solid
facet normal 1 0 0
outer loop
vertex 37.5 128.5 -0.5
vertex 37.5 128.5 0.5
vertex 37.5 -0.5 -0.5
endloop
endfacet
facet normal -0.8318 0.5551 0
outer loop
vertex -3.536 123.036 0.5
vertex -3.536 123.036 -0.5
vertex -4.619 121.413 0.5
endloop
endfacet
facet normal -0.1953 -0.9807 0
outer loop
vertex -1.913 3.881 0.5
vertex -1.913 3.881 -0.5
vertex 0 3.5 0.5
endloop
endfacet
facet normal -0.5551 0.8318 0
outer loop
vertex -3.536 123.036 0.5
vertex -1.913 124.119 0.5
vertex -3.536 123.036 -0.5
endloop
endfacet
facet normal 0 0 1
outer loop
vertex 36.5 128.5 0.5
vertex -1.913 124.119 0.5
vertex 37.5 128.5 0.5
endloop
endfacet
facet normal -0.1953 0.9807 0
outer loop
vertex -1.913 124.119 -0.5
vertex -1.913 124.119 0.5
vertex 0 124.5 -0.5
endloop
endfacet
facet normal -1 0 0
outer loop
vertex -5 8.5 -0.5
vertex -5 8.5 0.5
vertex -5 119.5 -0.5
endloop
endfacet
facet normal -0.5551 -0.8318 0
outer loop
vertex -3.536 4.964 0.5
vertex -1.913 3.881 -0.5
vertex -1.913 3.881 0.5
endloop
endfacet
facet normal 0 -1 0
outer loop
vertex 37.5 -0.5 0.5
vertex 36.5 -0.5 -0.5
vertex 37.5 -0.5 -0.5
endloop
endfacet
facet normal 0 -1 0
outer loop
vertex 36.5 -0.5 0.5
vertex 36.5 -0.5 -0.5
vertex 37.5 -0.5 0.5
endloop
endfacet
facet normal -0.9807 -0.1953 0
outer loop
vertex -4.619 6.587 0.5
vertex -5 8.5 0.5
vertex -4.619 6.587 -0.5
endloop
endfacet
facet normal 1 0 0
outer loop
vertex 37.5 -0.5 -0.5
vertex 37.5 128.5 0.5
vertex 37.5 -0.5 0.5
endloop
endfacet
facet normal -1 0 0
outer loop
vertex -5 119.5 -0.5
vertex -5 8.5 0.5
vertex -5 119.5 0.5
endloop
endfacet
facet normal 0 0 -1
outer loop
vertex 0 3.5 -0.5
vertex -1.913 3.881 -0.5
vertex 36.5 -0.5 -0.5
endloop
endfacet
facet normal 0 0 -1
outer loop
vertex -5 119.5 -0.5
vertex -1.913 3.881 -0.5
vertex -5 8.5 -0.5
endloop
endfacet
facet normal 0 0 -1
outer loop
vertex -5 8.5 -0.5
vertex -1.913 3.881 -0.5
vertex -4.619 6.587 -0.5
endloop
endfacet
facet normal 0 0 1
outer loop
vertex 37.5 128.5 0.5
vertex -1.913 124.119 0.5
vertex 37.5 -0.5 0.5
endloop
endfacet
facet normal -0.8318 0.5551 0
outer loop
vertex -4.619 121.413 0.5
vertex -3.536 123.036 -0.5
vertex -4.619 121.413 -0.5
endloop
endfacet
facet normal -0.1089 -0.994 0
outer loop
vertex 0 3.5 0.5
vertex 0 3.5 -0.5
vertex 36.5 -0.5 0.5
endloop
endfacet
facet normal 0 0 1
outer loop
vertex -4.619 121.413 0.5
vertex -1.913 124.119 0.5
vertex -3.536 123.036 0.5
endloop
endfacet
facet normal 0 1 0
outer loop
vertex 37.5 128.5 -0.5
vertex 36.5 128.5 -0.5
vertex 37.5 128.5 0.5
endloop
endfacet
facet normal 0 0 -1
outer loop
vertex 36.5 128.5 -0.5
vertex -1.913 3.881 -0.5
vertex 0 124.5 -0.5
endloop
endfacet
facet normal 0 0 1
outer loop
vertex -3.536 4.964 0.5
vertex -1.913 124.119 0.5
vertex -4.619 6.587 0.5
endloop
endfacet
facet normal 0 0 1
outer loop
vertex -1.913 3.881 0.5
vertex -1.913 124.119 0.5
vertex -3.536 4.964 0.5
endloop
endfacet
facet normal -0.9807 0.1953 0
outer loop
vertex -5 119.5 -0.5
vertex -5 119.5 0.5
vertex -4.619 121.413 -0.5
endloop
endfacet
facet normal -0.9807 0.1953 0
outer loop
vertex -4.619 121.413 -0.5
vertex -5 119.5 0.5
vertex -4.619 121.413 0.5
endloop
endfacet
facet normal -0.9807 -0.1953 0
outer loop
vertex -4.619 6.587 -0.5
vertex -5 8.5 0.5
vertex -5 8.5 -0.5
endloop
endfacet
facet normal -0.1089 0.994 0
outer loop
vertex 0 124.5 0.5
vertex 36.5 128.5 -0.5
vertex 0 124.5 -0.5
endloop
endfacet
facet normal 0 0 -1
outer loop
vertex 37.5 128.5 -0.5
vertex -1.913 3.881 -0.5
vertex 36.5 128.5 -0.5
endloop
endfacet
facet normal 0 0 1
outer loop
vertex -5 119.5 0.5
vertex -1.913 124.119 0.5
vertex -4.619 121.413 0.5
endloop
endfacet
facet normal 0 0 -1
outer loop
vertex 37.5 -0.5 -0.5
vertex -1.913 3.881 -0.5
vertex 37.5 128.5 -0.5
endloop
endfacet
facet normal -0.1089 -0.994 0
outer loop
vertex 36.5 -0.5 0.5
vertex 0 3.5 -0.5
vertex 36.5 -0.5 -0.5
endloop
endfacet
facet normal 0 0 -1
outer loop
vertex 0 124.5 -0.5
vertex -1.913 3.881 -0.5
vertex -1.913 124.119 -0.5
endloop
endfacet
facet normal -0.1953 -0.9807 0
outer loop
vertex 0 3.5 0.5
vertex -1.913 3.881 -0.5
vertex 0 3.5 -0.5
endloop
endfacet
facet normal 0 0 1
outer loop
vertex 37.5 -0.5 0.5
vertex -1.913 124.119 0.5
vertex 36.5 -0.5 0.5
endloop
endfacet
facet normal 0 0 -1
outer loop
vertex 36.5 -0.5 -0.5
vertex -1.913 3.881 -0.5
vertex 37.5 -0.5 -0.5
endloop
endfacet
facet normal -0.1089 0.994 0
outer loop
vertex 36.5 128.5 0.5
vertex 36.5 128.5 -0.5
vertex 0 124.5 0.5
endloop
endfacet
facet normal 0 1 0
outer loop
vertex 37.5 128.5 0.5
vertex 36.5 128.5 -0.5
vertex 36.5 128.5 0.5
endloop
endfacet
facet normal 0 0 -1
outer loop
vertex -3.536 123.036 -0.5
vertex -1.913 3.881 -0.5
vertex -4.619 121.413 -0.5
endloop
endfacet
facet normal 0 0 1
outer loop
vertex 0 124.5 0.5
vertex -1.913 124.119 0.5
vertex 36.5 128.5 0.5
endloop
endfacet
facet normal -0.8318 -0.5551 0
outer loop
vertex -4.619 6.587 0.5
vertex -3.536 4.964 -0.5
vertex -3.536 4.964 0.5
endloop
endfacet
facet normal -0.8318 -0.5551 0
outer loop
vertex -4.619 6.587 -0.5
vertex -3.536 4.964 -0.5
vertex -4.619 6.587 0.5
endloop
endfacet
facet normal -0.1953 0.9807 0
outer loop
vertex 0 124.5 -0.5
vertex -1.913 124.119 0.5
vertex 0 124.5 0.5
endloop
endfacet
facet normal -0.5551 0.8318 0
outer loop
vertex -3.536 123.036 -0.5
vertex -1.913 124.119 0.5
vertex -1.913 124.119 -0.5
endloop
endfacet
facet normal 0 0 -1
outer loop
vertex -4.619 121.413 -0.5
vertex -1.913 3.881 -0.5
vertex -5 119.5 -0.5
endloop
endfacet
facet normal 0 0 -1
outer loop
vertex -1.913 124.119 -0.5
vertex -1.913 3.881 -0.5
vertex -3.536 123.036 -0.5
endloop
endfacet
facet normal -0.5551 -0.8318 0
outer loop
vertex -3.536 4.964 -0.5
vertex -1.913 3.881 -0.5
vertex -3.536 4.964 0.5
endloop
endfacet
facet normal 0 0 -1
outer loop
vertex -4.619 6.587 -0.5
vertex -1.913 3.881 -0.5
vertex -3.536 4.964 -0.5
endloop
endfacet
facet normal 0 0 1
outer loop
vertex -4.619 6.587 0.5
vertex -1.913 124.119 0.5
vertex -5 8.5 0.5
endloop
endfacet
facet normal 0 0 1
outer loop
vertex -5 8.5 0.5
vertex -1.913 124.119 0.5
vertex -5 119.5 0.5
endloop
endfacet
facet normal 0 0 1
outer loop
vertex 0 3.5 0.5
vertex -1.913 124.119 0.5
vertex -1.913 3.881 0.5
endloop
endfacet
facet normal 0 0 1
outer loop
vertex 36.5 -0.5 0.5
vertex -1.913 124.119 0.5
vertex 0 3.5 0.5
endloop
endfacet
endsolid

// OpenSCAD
topL = 128;
bottomL = 111;
h = 37;
d=1;

hull(){
    translate([h,0,0])
    cube([1,1,d],true);
    translate([h,topL,0])
    cube([1,1,d],true);
    translate([0,(topL-bottomL)/2,0])
    union(){
        cylinder(r=5, h=d,center= true);
        translate([0,bottomL,0])
        cylinder(r=5, h=d,center= true);
    }
}
